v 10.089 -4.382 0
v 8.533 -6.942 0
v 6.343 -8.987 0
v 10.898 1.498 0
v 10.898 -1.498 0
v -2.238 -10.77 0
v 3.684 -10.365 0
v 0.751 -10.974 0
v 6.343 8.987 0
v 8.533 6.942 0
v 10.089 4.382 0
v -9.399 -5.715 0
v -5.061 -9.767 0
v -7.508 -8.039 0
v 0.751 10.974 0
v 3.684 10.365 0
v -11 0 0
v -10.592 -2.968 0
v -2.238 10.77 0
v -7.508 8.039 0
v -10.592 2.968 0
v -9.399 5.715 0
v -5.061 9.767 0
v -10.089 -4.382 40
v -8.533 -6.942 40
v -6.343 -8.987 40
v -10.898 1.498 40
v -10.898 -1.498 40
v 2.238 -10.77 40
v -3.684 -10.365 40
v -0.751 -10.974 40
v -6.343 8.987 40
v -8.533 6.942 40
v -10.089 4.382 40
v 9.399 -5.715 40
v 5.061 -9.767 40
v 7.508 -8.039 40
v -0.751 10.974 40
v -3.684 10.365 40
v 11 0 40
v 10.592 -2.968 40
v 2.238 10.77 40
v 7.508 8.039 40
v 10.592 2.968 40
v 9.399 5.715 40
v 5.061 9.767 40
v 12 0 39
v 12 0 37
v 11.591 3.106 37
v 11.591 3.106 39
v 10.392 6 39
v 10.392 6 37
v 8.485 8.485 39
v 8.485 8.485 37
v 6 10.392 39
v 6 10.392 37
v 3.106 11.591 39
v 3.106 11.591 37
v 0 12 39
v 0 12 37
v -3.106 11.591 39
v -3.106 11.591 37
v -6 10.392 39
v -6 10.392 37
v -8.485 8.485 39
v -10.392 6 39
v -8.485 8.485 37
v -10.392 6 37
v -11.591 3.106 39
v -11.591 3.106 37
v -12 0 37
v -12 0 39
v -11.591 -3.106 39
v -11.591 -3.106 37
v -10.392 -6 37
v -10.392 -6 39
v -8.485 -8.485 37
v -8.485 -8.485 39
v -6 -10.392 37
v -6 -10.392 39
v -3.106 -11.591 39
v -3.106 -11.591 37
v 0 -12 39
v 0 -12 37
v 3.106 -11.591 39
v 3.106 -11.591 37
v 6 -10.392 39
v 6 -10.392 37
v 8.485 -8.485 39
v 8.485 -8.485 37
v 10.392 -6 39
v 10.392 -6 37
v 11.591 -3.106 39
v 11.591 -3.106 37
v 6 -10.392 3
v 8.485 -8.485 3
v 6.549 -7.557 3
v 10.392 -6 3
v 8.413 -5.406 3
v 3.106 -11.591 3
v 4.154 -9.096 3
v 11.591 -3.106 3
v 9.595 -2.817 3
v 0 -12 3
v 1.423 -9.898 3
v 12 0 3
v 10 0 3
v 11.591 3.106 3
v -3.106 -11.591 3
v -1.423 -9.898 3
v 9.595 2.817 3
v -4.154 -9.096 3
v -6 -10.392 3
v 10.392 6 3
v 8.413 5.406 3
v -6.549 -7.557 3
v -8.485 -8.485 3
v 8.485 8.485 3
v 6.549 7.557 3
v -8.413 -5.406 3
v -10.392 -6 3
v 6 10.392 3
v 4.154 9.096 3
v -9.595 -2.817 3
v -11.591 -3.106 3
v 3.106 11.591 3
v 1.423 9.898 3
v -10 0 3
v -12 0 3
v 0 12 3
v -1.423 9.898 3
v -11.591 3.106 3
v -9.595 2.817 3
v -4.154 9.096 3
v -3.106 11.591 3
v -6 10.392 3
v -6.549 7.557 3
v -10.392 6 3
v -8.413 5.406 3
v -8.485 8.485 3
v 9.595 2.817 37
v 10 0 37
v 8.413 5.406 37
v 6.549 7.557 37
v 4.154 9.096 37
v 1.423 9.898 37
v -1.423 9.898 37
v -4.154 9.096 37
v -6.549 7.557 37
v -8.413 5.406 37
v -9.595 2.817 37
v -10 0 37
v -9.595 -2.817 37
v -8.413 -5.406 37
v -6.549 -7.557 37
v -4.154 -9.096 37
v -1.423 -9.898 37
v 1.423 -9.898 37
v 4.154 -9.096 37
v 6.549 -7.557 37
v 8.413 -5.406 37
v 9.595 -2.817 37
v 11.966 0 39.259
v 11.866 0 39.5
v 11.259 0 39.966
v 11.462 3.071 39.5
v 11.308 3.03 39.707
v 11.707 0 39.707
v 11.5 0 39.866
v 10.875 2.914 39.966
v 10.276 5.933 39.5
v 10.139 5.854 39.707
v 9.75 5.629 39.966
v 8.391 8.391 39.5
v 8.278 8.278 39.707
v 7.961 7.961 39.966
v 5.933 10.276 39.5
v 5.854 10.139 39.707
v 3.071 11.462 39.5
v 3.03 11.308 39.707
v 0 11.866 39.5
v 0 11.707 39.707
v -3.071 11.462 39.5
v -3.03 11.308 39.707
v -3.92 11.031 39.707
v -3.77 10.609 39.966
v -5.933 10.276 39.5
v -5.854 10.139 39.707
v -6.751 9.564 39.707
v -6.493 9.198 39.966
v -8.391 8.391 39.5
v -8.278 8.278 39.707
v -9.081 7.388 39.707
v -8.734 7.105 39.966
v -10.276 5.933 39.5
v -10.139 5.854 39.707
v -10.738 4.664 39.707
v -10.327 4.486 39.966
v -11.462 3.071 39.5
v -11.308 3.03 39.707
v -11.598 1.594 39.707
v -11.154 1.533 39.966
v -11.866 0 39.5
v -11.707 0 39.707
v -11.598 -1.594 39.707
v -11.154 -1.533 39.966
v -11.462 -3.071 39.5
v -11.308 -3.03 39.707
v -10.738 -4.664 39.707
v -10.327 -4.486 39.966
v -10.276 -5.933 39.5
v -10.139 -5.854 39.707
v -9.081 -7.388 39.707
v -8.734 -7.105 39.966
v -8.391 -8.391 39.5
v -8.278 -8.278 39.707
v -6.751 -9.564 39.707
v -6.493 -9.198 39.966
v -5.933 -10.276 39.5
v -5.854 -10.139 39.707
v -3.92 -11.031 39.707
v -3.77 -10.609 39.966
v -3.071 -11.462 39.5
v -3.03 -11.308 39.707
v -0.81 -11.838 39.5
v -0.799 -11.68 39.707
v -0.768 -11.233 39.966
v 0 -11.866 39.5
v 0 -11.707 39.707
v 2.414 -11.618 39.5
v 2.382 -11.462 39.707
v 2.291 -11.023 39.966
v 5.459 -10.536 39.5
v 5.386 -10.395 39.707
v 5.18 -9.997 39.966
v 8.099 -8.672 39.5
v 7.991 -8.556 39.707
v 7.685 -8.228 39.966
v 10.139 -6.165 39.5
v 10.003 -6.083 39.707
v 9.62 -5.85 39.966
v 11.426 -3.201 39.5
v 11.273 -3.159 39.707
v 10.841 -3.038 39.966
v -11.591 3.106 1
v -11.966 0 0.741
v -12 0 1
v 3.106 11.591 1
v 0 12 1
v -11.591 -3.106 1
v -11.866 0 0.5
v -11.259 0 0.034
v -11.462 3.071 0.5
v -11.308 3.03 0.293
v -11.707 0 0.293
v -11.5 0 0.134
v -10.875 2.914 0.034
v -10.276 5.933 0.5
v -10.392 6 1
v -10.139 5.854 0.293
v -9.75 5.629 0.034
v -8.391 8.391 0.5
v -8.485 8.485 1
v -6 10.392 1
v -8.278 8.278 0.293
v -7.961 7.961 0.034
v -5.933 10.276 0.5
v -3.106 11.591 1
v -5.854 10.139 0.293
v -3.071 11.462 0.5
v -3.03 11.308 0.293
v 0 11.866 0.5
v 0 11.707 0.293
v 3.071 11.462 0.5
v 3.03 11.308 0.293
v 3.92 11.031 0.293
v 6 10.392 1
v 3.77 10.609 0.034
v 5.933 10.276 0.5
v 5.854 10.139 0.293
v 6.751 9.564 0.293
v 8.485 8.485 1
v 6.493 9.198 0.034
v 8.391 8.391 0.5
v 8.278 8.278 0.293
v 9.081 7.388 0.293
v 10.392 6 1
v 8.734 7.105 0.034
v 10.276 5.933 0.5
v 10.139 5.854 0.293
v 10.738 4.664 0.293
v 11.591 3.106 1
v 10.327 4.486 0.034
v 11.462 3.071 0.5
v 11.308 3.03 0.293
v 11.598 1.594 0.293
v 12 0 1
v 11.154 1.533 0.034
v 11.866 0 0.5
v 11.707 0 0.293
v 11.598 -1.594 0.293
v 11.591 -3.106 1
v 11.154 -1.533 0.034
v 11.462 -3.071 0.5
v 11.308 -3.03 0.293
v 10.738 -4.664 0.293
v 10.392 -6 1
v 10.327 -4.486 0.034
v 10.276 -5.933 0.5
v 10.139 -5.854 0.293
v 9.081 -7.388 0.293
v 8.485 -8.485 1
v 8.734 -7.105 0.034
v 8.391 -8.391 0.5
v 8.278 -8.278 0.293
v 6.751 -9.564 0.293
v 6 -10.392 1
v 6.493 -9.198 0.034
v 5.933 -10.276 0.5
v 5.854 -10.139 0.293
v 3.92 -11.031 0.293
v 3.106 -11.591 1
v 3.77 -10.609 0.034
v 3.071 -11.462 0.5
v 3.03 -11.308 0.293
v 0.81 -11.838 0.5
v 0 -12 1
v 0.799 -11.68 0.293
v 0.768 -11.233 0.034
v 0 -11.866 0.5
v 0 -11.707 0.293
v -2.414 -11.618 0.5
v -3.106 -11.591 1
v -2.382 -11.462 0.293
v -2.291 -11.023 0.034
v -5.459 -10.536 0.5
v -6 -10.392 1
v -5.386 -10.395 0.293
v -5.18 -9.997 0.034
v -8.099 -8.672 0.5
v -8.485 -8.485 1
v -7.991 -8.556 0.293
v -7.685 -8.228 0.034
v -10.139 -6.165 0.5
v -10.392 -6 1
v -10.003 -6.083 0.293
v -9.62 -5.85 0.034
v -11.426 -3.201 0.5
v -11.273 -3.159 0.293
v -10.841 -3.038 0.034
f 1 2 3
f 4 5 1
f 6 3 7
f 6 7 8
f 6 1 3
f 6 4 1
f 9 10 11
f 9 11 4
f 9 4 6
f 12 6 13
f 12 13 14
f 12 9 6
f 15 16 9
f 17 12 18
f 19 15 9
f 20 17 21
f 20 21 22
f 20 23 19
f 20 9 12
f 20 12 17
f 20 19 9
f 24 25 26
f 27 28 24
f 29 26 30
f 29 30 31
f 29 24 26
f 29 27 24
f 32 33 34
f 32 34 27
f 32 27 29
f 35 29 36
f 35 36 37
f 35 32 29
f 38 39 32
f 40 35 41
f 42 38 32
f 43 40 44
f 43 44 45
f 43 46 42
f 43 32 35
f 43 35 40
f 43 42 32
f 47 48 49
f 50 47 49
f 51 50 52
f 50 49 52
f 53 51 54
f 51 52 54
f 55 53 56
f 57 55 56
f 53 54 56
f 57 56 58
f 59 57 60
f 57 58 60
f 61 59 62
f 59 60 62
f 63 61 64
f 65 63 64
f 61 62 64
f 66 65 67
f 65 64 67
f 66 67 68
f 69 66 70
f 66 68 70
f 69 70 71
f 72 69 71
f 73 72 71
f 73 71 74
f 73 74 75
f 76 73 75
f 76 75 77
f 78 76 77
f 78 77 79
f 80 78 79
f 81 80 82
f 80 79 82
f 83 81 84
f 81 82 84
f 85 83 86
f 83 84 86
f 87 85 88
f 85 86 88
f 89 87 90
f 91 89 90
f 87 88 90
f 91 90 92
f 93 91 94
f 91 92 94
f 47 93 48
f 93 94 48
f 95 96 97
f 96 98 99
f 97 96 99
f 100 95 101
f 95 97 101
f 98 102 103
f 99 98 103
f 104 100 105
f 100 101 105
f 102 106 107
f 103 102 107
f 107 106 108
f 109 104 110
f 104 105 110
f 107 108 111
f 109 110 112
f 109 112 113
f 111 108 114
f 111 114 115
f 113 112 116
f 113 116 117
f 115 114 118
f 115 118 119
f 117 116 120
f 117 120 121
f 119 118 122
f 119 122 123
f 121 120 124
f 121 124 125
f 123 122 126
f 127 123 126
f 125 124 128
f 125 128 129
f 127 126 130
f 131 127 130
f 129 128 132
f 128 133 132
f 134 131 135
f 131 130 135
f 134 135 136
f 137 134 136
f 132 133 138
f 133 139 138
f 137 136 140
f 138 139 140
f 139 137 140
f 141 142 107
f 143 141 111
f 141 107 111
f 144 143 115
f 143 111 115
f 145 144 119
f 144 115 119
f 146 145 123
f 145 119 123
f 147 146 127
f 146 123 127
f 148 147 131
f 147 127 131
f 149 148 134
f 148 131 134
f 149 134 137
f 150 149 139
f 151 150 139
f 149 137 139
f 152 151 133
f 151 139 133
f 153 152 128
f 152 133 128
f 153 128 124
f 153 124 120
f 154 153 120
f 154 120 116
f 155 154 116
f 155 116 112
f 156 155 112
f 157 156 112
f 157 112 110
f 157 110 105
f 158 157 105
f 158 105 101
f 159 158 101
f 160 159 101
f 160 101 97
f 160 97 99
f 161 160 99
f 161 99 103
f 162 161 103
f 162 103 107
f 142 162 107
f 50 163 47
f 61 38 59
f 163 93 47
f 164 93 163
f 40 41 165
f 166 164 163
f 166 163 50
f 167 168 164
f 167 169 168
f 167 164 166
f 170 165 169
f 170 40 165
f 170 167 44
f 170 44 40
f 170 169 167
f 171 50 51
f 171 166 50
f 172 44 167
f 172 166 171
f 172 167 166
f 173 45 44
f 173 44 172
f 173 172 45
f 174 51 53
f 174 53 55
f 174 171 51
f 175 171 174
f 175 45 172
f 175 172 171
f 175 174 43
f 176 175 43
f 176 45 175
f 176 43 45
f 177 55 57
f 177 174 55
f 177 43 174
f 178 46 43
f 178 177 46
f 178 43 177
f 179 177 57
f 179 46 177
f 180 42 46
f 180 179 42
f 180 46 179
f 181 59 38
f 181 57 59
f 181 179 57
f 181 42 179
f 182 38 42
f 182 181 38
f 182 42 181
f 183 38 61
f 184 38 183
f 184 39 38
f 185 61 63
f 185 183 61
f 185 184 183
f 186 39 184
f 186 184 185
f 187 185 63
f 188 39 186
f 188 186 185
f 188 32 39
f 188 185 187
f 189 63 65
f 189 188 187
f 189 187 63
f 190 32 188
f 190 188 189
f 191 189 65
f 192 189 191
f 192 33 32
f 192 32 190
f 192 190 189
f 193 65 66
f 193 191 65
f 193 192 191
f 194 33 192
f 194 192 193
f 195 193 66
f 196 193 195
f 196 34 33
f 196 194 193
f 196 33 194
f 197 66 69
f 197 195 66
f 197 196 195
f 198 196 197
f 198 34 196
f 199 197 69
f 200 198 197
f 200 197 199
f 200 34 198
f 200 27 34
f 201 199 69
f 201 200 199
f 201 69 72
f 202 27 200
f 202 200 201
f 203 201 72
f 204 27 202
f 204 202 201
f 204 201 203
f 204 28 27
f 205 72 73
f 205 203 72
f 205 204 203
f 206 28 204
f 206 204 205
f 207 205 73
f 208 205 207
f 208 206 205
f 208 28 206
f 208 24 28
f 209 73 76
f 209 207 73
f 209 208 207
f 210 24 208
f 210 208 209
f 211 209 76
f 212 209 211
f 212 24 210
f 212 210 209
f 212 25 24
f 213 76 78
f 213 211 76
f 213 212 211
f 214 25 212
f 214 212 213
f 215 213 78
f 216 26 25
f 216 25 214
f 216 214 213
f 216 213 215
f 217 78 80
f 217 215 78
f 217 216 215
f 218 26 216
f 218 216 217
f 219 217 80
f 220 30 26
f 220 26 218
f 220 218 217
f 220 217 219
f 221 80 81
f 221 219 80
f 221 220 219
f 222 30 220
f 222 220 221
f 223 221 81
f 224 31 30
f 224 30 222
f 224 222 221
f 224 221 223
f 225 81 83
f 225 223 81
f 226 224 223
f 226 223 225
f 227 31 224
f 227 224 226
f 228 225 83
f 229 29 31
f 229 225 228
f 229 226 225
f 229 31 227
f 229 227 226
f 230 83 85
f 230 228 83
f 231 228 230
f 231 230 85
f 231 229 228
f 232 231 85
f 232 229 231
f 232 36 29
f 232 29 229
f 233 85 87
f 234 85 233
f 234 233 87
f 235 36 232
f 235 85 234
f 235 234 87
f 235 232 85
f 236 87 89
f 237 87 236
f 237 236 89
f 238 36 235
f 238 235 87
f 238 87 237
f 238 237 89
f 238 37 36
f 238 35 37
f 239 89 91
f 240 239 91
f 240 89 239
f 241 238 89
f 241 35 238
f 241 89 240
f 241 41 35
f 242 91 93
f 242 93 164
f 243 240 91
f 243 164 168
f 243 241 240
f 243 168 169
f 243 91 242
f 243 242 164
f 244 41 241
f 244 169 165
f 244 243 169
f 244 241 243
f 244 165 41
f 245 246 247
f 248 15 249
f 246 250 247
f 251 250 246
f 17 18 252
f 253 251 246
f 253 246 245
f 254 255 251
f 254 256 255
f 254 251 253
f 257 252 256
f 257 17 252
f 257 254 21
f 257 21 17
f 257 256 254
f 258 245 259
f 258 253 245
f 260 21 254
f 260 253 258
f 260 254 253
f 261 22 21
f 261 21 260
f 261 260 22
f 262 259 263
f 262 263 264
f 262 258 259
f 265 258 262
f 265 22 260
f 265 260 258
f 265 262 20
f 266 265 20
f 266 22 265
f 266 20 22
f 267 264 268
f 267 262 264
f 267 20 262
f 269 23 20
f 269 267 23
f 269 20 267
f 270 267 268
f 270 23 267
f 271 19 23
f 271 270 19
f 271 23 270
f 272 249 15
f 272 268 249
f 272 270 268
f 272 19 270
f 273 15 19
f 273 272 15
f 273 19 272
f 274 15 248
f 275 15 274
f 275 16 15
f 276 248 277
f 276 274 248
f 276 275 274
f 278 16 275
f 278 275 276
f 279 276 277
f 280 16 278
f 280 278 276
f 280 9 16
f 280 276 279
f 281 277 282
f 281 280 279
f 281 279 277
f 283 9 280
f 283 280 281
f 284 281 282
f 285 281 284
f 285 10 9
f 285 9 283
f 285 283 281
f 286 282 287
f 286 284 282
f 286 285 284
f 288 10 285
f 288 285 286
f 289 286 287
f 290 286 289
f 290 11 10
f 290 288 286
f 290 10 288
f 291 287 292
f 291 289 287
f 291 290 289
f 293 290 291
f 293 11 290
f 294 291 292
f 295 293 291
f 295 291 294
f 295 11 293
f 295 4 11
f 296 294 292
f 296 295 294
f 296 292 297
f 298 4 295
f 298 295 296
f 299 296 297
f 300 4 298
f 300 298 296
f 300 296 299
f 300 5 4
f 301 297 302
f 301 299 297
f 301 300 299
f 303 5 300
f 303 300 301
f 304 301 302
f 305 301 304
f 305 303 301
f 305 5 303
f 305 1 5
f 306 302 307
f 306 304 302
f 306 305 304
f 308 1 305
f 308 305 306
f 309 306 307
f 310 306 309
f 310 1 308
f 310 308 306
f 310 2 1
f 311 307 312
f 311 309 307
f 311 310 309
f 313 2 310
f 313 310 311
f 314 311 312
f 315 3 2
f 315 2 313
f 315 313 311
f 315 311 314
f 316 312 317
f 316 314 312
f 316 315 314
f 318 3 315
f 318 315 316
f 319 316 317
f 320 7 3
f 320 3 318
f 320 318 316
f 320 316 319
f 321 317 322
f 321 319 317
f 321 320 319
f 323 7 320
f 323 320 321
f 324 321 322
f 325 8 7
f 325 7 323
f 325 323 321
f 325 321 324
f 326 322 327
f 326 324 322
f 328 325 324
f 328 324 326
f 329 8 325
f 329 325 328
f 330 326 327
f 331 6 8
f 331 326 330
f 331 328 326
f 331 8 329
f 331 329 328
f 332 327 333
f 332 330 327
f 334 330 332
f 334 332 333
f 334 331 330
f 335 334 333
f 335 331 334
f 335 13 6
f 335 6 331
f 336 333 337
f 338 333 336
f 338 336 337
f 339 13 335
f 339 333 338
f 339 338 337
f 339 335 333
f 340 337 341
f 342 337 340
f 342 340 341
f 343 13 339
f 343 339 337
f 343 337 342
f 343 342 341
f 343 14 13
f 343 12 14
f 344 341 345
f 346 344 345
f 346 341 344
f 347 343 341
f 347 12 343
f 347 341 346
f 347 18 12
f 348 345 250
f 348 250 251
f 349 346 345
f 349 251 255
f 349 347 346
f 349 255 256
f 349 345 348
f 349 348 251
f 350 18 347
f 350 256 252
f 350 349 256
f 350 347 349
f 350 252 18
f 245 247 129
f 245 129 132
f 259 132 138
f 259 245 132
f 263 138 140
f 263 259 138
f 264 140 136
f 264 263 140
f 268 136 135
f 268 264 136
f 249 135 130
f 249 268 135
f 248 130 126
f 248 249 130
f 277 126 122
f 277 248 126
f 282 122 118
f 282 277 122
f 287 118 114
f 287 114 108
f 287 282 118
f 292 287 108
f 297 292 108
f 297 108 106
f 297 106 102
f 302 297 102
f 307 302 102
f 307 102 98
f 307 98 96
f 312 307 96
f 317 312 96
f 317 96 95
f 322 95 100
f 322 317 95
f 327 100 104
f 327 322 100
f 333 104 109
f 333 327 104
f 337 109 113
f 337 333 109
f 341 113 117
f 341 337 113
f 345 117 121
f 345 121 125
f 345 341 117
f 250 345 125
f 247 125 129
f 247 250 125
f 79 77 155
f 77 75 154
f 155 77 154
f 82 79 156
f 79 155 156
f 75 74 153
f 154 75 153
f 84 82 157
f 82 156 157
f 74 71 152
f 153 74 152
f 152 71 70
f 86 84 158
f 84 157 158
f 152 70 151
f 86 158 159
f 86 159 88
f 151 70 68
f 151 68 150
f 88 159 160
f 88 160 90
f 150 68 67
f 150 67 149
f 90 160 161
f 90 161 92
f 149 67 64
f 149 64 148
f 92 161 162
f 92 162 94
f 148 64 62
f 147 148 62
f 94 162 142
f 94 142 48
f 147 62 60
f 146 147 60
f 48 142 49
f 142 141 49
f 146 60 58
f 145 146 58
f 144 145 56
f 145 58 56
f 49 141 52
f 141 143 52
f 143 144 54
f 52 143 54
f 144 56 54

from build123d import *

# Parameters (mm, degrees)
SKETCH_1_R        = 10
EXTRUDE_1_DEPTH   = 40
EXTRUDE_START     = -3
SKETCH_3_R        = 12
SKETCH_3_R_2      = 10
EXTRUDE_1_2_DEPTH = 3
SKETCH_4_R        = 12
SKETCH_4_R_2      = 10
EXTRUDE_2_DEPTH   = 3
FILLET_4_R        = 1


with BuildPart() as part:
    # 草图1 → Extrude 1 (new body)
    with BuildSketch(Plane.XY):
        Circle(SKETCH_1_R)
    extrude(amount=EXTRUDE_1_DEPTH)

    # 草图3 → Extrude 1 2 (add)
    with BuildSketch(Plane.XY.offset(40).offset(EXTRUDE_START)):
        Circle(SKETCH_3_R)
        Circle(SKETCH_3_R_2, mode=Mode.SUBTRACT)
    extrude(amount=EXTRUDE_1_2_DEPTH)

    # 草图4 → 拉伸-薄壁2 (add)
    with BuildSketch(Plane(origin=(0, 0, 0), x_dir=(-1, 0, 0), z_dir=(0, 0, -1))):
        Circle(SKETCH_4_R)
        Circle(SKETCH_4_R_2, mode=Mode.SUBTRACT)
    extrude(amount=-EXTRUDE_2_DEPTH)

    # 圆角4
    fillet_4_edges = [part.edges().sort_by_distance(p)[0] for p in [
        (12, 0, 0),
        (-12, 0, 40),
    ]]
    fillet(fillet_4_edges, radius=FILLET_4_R)


solid = part.part
